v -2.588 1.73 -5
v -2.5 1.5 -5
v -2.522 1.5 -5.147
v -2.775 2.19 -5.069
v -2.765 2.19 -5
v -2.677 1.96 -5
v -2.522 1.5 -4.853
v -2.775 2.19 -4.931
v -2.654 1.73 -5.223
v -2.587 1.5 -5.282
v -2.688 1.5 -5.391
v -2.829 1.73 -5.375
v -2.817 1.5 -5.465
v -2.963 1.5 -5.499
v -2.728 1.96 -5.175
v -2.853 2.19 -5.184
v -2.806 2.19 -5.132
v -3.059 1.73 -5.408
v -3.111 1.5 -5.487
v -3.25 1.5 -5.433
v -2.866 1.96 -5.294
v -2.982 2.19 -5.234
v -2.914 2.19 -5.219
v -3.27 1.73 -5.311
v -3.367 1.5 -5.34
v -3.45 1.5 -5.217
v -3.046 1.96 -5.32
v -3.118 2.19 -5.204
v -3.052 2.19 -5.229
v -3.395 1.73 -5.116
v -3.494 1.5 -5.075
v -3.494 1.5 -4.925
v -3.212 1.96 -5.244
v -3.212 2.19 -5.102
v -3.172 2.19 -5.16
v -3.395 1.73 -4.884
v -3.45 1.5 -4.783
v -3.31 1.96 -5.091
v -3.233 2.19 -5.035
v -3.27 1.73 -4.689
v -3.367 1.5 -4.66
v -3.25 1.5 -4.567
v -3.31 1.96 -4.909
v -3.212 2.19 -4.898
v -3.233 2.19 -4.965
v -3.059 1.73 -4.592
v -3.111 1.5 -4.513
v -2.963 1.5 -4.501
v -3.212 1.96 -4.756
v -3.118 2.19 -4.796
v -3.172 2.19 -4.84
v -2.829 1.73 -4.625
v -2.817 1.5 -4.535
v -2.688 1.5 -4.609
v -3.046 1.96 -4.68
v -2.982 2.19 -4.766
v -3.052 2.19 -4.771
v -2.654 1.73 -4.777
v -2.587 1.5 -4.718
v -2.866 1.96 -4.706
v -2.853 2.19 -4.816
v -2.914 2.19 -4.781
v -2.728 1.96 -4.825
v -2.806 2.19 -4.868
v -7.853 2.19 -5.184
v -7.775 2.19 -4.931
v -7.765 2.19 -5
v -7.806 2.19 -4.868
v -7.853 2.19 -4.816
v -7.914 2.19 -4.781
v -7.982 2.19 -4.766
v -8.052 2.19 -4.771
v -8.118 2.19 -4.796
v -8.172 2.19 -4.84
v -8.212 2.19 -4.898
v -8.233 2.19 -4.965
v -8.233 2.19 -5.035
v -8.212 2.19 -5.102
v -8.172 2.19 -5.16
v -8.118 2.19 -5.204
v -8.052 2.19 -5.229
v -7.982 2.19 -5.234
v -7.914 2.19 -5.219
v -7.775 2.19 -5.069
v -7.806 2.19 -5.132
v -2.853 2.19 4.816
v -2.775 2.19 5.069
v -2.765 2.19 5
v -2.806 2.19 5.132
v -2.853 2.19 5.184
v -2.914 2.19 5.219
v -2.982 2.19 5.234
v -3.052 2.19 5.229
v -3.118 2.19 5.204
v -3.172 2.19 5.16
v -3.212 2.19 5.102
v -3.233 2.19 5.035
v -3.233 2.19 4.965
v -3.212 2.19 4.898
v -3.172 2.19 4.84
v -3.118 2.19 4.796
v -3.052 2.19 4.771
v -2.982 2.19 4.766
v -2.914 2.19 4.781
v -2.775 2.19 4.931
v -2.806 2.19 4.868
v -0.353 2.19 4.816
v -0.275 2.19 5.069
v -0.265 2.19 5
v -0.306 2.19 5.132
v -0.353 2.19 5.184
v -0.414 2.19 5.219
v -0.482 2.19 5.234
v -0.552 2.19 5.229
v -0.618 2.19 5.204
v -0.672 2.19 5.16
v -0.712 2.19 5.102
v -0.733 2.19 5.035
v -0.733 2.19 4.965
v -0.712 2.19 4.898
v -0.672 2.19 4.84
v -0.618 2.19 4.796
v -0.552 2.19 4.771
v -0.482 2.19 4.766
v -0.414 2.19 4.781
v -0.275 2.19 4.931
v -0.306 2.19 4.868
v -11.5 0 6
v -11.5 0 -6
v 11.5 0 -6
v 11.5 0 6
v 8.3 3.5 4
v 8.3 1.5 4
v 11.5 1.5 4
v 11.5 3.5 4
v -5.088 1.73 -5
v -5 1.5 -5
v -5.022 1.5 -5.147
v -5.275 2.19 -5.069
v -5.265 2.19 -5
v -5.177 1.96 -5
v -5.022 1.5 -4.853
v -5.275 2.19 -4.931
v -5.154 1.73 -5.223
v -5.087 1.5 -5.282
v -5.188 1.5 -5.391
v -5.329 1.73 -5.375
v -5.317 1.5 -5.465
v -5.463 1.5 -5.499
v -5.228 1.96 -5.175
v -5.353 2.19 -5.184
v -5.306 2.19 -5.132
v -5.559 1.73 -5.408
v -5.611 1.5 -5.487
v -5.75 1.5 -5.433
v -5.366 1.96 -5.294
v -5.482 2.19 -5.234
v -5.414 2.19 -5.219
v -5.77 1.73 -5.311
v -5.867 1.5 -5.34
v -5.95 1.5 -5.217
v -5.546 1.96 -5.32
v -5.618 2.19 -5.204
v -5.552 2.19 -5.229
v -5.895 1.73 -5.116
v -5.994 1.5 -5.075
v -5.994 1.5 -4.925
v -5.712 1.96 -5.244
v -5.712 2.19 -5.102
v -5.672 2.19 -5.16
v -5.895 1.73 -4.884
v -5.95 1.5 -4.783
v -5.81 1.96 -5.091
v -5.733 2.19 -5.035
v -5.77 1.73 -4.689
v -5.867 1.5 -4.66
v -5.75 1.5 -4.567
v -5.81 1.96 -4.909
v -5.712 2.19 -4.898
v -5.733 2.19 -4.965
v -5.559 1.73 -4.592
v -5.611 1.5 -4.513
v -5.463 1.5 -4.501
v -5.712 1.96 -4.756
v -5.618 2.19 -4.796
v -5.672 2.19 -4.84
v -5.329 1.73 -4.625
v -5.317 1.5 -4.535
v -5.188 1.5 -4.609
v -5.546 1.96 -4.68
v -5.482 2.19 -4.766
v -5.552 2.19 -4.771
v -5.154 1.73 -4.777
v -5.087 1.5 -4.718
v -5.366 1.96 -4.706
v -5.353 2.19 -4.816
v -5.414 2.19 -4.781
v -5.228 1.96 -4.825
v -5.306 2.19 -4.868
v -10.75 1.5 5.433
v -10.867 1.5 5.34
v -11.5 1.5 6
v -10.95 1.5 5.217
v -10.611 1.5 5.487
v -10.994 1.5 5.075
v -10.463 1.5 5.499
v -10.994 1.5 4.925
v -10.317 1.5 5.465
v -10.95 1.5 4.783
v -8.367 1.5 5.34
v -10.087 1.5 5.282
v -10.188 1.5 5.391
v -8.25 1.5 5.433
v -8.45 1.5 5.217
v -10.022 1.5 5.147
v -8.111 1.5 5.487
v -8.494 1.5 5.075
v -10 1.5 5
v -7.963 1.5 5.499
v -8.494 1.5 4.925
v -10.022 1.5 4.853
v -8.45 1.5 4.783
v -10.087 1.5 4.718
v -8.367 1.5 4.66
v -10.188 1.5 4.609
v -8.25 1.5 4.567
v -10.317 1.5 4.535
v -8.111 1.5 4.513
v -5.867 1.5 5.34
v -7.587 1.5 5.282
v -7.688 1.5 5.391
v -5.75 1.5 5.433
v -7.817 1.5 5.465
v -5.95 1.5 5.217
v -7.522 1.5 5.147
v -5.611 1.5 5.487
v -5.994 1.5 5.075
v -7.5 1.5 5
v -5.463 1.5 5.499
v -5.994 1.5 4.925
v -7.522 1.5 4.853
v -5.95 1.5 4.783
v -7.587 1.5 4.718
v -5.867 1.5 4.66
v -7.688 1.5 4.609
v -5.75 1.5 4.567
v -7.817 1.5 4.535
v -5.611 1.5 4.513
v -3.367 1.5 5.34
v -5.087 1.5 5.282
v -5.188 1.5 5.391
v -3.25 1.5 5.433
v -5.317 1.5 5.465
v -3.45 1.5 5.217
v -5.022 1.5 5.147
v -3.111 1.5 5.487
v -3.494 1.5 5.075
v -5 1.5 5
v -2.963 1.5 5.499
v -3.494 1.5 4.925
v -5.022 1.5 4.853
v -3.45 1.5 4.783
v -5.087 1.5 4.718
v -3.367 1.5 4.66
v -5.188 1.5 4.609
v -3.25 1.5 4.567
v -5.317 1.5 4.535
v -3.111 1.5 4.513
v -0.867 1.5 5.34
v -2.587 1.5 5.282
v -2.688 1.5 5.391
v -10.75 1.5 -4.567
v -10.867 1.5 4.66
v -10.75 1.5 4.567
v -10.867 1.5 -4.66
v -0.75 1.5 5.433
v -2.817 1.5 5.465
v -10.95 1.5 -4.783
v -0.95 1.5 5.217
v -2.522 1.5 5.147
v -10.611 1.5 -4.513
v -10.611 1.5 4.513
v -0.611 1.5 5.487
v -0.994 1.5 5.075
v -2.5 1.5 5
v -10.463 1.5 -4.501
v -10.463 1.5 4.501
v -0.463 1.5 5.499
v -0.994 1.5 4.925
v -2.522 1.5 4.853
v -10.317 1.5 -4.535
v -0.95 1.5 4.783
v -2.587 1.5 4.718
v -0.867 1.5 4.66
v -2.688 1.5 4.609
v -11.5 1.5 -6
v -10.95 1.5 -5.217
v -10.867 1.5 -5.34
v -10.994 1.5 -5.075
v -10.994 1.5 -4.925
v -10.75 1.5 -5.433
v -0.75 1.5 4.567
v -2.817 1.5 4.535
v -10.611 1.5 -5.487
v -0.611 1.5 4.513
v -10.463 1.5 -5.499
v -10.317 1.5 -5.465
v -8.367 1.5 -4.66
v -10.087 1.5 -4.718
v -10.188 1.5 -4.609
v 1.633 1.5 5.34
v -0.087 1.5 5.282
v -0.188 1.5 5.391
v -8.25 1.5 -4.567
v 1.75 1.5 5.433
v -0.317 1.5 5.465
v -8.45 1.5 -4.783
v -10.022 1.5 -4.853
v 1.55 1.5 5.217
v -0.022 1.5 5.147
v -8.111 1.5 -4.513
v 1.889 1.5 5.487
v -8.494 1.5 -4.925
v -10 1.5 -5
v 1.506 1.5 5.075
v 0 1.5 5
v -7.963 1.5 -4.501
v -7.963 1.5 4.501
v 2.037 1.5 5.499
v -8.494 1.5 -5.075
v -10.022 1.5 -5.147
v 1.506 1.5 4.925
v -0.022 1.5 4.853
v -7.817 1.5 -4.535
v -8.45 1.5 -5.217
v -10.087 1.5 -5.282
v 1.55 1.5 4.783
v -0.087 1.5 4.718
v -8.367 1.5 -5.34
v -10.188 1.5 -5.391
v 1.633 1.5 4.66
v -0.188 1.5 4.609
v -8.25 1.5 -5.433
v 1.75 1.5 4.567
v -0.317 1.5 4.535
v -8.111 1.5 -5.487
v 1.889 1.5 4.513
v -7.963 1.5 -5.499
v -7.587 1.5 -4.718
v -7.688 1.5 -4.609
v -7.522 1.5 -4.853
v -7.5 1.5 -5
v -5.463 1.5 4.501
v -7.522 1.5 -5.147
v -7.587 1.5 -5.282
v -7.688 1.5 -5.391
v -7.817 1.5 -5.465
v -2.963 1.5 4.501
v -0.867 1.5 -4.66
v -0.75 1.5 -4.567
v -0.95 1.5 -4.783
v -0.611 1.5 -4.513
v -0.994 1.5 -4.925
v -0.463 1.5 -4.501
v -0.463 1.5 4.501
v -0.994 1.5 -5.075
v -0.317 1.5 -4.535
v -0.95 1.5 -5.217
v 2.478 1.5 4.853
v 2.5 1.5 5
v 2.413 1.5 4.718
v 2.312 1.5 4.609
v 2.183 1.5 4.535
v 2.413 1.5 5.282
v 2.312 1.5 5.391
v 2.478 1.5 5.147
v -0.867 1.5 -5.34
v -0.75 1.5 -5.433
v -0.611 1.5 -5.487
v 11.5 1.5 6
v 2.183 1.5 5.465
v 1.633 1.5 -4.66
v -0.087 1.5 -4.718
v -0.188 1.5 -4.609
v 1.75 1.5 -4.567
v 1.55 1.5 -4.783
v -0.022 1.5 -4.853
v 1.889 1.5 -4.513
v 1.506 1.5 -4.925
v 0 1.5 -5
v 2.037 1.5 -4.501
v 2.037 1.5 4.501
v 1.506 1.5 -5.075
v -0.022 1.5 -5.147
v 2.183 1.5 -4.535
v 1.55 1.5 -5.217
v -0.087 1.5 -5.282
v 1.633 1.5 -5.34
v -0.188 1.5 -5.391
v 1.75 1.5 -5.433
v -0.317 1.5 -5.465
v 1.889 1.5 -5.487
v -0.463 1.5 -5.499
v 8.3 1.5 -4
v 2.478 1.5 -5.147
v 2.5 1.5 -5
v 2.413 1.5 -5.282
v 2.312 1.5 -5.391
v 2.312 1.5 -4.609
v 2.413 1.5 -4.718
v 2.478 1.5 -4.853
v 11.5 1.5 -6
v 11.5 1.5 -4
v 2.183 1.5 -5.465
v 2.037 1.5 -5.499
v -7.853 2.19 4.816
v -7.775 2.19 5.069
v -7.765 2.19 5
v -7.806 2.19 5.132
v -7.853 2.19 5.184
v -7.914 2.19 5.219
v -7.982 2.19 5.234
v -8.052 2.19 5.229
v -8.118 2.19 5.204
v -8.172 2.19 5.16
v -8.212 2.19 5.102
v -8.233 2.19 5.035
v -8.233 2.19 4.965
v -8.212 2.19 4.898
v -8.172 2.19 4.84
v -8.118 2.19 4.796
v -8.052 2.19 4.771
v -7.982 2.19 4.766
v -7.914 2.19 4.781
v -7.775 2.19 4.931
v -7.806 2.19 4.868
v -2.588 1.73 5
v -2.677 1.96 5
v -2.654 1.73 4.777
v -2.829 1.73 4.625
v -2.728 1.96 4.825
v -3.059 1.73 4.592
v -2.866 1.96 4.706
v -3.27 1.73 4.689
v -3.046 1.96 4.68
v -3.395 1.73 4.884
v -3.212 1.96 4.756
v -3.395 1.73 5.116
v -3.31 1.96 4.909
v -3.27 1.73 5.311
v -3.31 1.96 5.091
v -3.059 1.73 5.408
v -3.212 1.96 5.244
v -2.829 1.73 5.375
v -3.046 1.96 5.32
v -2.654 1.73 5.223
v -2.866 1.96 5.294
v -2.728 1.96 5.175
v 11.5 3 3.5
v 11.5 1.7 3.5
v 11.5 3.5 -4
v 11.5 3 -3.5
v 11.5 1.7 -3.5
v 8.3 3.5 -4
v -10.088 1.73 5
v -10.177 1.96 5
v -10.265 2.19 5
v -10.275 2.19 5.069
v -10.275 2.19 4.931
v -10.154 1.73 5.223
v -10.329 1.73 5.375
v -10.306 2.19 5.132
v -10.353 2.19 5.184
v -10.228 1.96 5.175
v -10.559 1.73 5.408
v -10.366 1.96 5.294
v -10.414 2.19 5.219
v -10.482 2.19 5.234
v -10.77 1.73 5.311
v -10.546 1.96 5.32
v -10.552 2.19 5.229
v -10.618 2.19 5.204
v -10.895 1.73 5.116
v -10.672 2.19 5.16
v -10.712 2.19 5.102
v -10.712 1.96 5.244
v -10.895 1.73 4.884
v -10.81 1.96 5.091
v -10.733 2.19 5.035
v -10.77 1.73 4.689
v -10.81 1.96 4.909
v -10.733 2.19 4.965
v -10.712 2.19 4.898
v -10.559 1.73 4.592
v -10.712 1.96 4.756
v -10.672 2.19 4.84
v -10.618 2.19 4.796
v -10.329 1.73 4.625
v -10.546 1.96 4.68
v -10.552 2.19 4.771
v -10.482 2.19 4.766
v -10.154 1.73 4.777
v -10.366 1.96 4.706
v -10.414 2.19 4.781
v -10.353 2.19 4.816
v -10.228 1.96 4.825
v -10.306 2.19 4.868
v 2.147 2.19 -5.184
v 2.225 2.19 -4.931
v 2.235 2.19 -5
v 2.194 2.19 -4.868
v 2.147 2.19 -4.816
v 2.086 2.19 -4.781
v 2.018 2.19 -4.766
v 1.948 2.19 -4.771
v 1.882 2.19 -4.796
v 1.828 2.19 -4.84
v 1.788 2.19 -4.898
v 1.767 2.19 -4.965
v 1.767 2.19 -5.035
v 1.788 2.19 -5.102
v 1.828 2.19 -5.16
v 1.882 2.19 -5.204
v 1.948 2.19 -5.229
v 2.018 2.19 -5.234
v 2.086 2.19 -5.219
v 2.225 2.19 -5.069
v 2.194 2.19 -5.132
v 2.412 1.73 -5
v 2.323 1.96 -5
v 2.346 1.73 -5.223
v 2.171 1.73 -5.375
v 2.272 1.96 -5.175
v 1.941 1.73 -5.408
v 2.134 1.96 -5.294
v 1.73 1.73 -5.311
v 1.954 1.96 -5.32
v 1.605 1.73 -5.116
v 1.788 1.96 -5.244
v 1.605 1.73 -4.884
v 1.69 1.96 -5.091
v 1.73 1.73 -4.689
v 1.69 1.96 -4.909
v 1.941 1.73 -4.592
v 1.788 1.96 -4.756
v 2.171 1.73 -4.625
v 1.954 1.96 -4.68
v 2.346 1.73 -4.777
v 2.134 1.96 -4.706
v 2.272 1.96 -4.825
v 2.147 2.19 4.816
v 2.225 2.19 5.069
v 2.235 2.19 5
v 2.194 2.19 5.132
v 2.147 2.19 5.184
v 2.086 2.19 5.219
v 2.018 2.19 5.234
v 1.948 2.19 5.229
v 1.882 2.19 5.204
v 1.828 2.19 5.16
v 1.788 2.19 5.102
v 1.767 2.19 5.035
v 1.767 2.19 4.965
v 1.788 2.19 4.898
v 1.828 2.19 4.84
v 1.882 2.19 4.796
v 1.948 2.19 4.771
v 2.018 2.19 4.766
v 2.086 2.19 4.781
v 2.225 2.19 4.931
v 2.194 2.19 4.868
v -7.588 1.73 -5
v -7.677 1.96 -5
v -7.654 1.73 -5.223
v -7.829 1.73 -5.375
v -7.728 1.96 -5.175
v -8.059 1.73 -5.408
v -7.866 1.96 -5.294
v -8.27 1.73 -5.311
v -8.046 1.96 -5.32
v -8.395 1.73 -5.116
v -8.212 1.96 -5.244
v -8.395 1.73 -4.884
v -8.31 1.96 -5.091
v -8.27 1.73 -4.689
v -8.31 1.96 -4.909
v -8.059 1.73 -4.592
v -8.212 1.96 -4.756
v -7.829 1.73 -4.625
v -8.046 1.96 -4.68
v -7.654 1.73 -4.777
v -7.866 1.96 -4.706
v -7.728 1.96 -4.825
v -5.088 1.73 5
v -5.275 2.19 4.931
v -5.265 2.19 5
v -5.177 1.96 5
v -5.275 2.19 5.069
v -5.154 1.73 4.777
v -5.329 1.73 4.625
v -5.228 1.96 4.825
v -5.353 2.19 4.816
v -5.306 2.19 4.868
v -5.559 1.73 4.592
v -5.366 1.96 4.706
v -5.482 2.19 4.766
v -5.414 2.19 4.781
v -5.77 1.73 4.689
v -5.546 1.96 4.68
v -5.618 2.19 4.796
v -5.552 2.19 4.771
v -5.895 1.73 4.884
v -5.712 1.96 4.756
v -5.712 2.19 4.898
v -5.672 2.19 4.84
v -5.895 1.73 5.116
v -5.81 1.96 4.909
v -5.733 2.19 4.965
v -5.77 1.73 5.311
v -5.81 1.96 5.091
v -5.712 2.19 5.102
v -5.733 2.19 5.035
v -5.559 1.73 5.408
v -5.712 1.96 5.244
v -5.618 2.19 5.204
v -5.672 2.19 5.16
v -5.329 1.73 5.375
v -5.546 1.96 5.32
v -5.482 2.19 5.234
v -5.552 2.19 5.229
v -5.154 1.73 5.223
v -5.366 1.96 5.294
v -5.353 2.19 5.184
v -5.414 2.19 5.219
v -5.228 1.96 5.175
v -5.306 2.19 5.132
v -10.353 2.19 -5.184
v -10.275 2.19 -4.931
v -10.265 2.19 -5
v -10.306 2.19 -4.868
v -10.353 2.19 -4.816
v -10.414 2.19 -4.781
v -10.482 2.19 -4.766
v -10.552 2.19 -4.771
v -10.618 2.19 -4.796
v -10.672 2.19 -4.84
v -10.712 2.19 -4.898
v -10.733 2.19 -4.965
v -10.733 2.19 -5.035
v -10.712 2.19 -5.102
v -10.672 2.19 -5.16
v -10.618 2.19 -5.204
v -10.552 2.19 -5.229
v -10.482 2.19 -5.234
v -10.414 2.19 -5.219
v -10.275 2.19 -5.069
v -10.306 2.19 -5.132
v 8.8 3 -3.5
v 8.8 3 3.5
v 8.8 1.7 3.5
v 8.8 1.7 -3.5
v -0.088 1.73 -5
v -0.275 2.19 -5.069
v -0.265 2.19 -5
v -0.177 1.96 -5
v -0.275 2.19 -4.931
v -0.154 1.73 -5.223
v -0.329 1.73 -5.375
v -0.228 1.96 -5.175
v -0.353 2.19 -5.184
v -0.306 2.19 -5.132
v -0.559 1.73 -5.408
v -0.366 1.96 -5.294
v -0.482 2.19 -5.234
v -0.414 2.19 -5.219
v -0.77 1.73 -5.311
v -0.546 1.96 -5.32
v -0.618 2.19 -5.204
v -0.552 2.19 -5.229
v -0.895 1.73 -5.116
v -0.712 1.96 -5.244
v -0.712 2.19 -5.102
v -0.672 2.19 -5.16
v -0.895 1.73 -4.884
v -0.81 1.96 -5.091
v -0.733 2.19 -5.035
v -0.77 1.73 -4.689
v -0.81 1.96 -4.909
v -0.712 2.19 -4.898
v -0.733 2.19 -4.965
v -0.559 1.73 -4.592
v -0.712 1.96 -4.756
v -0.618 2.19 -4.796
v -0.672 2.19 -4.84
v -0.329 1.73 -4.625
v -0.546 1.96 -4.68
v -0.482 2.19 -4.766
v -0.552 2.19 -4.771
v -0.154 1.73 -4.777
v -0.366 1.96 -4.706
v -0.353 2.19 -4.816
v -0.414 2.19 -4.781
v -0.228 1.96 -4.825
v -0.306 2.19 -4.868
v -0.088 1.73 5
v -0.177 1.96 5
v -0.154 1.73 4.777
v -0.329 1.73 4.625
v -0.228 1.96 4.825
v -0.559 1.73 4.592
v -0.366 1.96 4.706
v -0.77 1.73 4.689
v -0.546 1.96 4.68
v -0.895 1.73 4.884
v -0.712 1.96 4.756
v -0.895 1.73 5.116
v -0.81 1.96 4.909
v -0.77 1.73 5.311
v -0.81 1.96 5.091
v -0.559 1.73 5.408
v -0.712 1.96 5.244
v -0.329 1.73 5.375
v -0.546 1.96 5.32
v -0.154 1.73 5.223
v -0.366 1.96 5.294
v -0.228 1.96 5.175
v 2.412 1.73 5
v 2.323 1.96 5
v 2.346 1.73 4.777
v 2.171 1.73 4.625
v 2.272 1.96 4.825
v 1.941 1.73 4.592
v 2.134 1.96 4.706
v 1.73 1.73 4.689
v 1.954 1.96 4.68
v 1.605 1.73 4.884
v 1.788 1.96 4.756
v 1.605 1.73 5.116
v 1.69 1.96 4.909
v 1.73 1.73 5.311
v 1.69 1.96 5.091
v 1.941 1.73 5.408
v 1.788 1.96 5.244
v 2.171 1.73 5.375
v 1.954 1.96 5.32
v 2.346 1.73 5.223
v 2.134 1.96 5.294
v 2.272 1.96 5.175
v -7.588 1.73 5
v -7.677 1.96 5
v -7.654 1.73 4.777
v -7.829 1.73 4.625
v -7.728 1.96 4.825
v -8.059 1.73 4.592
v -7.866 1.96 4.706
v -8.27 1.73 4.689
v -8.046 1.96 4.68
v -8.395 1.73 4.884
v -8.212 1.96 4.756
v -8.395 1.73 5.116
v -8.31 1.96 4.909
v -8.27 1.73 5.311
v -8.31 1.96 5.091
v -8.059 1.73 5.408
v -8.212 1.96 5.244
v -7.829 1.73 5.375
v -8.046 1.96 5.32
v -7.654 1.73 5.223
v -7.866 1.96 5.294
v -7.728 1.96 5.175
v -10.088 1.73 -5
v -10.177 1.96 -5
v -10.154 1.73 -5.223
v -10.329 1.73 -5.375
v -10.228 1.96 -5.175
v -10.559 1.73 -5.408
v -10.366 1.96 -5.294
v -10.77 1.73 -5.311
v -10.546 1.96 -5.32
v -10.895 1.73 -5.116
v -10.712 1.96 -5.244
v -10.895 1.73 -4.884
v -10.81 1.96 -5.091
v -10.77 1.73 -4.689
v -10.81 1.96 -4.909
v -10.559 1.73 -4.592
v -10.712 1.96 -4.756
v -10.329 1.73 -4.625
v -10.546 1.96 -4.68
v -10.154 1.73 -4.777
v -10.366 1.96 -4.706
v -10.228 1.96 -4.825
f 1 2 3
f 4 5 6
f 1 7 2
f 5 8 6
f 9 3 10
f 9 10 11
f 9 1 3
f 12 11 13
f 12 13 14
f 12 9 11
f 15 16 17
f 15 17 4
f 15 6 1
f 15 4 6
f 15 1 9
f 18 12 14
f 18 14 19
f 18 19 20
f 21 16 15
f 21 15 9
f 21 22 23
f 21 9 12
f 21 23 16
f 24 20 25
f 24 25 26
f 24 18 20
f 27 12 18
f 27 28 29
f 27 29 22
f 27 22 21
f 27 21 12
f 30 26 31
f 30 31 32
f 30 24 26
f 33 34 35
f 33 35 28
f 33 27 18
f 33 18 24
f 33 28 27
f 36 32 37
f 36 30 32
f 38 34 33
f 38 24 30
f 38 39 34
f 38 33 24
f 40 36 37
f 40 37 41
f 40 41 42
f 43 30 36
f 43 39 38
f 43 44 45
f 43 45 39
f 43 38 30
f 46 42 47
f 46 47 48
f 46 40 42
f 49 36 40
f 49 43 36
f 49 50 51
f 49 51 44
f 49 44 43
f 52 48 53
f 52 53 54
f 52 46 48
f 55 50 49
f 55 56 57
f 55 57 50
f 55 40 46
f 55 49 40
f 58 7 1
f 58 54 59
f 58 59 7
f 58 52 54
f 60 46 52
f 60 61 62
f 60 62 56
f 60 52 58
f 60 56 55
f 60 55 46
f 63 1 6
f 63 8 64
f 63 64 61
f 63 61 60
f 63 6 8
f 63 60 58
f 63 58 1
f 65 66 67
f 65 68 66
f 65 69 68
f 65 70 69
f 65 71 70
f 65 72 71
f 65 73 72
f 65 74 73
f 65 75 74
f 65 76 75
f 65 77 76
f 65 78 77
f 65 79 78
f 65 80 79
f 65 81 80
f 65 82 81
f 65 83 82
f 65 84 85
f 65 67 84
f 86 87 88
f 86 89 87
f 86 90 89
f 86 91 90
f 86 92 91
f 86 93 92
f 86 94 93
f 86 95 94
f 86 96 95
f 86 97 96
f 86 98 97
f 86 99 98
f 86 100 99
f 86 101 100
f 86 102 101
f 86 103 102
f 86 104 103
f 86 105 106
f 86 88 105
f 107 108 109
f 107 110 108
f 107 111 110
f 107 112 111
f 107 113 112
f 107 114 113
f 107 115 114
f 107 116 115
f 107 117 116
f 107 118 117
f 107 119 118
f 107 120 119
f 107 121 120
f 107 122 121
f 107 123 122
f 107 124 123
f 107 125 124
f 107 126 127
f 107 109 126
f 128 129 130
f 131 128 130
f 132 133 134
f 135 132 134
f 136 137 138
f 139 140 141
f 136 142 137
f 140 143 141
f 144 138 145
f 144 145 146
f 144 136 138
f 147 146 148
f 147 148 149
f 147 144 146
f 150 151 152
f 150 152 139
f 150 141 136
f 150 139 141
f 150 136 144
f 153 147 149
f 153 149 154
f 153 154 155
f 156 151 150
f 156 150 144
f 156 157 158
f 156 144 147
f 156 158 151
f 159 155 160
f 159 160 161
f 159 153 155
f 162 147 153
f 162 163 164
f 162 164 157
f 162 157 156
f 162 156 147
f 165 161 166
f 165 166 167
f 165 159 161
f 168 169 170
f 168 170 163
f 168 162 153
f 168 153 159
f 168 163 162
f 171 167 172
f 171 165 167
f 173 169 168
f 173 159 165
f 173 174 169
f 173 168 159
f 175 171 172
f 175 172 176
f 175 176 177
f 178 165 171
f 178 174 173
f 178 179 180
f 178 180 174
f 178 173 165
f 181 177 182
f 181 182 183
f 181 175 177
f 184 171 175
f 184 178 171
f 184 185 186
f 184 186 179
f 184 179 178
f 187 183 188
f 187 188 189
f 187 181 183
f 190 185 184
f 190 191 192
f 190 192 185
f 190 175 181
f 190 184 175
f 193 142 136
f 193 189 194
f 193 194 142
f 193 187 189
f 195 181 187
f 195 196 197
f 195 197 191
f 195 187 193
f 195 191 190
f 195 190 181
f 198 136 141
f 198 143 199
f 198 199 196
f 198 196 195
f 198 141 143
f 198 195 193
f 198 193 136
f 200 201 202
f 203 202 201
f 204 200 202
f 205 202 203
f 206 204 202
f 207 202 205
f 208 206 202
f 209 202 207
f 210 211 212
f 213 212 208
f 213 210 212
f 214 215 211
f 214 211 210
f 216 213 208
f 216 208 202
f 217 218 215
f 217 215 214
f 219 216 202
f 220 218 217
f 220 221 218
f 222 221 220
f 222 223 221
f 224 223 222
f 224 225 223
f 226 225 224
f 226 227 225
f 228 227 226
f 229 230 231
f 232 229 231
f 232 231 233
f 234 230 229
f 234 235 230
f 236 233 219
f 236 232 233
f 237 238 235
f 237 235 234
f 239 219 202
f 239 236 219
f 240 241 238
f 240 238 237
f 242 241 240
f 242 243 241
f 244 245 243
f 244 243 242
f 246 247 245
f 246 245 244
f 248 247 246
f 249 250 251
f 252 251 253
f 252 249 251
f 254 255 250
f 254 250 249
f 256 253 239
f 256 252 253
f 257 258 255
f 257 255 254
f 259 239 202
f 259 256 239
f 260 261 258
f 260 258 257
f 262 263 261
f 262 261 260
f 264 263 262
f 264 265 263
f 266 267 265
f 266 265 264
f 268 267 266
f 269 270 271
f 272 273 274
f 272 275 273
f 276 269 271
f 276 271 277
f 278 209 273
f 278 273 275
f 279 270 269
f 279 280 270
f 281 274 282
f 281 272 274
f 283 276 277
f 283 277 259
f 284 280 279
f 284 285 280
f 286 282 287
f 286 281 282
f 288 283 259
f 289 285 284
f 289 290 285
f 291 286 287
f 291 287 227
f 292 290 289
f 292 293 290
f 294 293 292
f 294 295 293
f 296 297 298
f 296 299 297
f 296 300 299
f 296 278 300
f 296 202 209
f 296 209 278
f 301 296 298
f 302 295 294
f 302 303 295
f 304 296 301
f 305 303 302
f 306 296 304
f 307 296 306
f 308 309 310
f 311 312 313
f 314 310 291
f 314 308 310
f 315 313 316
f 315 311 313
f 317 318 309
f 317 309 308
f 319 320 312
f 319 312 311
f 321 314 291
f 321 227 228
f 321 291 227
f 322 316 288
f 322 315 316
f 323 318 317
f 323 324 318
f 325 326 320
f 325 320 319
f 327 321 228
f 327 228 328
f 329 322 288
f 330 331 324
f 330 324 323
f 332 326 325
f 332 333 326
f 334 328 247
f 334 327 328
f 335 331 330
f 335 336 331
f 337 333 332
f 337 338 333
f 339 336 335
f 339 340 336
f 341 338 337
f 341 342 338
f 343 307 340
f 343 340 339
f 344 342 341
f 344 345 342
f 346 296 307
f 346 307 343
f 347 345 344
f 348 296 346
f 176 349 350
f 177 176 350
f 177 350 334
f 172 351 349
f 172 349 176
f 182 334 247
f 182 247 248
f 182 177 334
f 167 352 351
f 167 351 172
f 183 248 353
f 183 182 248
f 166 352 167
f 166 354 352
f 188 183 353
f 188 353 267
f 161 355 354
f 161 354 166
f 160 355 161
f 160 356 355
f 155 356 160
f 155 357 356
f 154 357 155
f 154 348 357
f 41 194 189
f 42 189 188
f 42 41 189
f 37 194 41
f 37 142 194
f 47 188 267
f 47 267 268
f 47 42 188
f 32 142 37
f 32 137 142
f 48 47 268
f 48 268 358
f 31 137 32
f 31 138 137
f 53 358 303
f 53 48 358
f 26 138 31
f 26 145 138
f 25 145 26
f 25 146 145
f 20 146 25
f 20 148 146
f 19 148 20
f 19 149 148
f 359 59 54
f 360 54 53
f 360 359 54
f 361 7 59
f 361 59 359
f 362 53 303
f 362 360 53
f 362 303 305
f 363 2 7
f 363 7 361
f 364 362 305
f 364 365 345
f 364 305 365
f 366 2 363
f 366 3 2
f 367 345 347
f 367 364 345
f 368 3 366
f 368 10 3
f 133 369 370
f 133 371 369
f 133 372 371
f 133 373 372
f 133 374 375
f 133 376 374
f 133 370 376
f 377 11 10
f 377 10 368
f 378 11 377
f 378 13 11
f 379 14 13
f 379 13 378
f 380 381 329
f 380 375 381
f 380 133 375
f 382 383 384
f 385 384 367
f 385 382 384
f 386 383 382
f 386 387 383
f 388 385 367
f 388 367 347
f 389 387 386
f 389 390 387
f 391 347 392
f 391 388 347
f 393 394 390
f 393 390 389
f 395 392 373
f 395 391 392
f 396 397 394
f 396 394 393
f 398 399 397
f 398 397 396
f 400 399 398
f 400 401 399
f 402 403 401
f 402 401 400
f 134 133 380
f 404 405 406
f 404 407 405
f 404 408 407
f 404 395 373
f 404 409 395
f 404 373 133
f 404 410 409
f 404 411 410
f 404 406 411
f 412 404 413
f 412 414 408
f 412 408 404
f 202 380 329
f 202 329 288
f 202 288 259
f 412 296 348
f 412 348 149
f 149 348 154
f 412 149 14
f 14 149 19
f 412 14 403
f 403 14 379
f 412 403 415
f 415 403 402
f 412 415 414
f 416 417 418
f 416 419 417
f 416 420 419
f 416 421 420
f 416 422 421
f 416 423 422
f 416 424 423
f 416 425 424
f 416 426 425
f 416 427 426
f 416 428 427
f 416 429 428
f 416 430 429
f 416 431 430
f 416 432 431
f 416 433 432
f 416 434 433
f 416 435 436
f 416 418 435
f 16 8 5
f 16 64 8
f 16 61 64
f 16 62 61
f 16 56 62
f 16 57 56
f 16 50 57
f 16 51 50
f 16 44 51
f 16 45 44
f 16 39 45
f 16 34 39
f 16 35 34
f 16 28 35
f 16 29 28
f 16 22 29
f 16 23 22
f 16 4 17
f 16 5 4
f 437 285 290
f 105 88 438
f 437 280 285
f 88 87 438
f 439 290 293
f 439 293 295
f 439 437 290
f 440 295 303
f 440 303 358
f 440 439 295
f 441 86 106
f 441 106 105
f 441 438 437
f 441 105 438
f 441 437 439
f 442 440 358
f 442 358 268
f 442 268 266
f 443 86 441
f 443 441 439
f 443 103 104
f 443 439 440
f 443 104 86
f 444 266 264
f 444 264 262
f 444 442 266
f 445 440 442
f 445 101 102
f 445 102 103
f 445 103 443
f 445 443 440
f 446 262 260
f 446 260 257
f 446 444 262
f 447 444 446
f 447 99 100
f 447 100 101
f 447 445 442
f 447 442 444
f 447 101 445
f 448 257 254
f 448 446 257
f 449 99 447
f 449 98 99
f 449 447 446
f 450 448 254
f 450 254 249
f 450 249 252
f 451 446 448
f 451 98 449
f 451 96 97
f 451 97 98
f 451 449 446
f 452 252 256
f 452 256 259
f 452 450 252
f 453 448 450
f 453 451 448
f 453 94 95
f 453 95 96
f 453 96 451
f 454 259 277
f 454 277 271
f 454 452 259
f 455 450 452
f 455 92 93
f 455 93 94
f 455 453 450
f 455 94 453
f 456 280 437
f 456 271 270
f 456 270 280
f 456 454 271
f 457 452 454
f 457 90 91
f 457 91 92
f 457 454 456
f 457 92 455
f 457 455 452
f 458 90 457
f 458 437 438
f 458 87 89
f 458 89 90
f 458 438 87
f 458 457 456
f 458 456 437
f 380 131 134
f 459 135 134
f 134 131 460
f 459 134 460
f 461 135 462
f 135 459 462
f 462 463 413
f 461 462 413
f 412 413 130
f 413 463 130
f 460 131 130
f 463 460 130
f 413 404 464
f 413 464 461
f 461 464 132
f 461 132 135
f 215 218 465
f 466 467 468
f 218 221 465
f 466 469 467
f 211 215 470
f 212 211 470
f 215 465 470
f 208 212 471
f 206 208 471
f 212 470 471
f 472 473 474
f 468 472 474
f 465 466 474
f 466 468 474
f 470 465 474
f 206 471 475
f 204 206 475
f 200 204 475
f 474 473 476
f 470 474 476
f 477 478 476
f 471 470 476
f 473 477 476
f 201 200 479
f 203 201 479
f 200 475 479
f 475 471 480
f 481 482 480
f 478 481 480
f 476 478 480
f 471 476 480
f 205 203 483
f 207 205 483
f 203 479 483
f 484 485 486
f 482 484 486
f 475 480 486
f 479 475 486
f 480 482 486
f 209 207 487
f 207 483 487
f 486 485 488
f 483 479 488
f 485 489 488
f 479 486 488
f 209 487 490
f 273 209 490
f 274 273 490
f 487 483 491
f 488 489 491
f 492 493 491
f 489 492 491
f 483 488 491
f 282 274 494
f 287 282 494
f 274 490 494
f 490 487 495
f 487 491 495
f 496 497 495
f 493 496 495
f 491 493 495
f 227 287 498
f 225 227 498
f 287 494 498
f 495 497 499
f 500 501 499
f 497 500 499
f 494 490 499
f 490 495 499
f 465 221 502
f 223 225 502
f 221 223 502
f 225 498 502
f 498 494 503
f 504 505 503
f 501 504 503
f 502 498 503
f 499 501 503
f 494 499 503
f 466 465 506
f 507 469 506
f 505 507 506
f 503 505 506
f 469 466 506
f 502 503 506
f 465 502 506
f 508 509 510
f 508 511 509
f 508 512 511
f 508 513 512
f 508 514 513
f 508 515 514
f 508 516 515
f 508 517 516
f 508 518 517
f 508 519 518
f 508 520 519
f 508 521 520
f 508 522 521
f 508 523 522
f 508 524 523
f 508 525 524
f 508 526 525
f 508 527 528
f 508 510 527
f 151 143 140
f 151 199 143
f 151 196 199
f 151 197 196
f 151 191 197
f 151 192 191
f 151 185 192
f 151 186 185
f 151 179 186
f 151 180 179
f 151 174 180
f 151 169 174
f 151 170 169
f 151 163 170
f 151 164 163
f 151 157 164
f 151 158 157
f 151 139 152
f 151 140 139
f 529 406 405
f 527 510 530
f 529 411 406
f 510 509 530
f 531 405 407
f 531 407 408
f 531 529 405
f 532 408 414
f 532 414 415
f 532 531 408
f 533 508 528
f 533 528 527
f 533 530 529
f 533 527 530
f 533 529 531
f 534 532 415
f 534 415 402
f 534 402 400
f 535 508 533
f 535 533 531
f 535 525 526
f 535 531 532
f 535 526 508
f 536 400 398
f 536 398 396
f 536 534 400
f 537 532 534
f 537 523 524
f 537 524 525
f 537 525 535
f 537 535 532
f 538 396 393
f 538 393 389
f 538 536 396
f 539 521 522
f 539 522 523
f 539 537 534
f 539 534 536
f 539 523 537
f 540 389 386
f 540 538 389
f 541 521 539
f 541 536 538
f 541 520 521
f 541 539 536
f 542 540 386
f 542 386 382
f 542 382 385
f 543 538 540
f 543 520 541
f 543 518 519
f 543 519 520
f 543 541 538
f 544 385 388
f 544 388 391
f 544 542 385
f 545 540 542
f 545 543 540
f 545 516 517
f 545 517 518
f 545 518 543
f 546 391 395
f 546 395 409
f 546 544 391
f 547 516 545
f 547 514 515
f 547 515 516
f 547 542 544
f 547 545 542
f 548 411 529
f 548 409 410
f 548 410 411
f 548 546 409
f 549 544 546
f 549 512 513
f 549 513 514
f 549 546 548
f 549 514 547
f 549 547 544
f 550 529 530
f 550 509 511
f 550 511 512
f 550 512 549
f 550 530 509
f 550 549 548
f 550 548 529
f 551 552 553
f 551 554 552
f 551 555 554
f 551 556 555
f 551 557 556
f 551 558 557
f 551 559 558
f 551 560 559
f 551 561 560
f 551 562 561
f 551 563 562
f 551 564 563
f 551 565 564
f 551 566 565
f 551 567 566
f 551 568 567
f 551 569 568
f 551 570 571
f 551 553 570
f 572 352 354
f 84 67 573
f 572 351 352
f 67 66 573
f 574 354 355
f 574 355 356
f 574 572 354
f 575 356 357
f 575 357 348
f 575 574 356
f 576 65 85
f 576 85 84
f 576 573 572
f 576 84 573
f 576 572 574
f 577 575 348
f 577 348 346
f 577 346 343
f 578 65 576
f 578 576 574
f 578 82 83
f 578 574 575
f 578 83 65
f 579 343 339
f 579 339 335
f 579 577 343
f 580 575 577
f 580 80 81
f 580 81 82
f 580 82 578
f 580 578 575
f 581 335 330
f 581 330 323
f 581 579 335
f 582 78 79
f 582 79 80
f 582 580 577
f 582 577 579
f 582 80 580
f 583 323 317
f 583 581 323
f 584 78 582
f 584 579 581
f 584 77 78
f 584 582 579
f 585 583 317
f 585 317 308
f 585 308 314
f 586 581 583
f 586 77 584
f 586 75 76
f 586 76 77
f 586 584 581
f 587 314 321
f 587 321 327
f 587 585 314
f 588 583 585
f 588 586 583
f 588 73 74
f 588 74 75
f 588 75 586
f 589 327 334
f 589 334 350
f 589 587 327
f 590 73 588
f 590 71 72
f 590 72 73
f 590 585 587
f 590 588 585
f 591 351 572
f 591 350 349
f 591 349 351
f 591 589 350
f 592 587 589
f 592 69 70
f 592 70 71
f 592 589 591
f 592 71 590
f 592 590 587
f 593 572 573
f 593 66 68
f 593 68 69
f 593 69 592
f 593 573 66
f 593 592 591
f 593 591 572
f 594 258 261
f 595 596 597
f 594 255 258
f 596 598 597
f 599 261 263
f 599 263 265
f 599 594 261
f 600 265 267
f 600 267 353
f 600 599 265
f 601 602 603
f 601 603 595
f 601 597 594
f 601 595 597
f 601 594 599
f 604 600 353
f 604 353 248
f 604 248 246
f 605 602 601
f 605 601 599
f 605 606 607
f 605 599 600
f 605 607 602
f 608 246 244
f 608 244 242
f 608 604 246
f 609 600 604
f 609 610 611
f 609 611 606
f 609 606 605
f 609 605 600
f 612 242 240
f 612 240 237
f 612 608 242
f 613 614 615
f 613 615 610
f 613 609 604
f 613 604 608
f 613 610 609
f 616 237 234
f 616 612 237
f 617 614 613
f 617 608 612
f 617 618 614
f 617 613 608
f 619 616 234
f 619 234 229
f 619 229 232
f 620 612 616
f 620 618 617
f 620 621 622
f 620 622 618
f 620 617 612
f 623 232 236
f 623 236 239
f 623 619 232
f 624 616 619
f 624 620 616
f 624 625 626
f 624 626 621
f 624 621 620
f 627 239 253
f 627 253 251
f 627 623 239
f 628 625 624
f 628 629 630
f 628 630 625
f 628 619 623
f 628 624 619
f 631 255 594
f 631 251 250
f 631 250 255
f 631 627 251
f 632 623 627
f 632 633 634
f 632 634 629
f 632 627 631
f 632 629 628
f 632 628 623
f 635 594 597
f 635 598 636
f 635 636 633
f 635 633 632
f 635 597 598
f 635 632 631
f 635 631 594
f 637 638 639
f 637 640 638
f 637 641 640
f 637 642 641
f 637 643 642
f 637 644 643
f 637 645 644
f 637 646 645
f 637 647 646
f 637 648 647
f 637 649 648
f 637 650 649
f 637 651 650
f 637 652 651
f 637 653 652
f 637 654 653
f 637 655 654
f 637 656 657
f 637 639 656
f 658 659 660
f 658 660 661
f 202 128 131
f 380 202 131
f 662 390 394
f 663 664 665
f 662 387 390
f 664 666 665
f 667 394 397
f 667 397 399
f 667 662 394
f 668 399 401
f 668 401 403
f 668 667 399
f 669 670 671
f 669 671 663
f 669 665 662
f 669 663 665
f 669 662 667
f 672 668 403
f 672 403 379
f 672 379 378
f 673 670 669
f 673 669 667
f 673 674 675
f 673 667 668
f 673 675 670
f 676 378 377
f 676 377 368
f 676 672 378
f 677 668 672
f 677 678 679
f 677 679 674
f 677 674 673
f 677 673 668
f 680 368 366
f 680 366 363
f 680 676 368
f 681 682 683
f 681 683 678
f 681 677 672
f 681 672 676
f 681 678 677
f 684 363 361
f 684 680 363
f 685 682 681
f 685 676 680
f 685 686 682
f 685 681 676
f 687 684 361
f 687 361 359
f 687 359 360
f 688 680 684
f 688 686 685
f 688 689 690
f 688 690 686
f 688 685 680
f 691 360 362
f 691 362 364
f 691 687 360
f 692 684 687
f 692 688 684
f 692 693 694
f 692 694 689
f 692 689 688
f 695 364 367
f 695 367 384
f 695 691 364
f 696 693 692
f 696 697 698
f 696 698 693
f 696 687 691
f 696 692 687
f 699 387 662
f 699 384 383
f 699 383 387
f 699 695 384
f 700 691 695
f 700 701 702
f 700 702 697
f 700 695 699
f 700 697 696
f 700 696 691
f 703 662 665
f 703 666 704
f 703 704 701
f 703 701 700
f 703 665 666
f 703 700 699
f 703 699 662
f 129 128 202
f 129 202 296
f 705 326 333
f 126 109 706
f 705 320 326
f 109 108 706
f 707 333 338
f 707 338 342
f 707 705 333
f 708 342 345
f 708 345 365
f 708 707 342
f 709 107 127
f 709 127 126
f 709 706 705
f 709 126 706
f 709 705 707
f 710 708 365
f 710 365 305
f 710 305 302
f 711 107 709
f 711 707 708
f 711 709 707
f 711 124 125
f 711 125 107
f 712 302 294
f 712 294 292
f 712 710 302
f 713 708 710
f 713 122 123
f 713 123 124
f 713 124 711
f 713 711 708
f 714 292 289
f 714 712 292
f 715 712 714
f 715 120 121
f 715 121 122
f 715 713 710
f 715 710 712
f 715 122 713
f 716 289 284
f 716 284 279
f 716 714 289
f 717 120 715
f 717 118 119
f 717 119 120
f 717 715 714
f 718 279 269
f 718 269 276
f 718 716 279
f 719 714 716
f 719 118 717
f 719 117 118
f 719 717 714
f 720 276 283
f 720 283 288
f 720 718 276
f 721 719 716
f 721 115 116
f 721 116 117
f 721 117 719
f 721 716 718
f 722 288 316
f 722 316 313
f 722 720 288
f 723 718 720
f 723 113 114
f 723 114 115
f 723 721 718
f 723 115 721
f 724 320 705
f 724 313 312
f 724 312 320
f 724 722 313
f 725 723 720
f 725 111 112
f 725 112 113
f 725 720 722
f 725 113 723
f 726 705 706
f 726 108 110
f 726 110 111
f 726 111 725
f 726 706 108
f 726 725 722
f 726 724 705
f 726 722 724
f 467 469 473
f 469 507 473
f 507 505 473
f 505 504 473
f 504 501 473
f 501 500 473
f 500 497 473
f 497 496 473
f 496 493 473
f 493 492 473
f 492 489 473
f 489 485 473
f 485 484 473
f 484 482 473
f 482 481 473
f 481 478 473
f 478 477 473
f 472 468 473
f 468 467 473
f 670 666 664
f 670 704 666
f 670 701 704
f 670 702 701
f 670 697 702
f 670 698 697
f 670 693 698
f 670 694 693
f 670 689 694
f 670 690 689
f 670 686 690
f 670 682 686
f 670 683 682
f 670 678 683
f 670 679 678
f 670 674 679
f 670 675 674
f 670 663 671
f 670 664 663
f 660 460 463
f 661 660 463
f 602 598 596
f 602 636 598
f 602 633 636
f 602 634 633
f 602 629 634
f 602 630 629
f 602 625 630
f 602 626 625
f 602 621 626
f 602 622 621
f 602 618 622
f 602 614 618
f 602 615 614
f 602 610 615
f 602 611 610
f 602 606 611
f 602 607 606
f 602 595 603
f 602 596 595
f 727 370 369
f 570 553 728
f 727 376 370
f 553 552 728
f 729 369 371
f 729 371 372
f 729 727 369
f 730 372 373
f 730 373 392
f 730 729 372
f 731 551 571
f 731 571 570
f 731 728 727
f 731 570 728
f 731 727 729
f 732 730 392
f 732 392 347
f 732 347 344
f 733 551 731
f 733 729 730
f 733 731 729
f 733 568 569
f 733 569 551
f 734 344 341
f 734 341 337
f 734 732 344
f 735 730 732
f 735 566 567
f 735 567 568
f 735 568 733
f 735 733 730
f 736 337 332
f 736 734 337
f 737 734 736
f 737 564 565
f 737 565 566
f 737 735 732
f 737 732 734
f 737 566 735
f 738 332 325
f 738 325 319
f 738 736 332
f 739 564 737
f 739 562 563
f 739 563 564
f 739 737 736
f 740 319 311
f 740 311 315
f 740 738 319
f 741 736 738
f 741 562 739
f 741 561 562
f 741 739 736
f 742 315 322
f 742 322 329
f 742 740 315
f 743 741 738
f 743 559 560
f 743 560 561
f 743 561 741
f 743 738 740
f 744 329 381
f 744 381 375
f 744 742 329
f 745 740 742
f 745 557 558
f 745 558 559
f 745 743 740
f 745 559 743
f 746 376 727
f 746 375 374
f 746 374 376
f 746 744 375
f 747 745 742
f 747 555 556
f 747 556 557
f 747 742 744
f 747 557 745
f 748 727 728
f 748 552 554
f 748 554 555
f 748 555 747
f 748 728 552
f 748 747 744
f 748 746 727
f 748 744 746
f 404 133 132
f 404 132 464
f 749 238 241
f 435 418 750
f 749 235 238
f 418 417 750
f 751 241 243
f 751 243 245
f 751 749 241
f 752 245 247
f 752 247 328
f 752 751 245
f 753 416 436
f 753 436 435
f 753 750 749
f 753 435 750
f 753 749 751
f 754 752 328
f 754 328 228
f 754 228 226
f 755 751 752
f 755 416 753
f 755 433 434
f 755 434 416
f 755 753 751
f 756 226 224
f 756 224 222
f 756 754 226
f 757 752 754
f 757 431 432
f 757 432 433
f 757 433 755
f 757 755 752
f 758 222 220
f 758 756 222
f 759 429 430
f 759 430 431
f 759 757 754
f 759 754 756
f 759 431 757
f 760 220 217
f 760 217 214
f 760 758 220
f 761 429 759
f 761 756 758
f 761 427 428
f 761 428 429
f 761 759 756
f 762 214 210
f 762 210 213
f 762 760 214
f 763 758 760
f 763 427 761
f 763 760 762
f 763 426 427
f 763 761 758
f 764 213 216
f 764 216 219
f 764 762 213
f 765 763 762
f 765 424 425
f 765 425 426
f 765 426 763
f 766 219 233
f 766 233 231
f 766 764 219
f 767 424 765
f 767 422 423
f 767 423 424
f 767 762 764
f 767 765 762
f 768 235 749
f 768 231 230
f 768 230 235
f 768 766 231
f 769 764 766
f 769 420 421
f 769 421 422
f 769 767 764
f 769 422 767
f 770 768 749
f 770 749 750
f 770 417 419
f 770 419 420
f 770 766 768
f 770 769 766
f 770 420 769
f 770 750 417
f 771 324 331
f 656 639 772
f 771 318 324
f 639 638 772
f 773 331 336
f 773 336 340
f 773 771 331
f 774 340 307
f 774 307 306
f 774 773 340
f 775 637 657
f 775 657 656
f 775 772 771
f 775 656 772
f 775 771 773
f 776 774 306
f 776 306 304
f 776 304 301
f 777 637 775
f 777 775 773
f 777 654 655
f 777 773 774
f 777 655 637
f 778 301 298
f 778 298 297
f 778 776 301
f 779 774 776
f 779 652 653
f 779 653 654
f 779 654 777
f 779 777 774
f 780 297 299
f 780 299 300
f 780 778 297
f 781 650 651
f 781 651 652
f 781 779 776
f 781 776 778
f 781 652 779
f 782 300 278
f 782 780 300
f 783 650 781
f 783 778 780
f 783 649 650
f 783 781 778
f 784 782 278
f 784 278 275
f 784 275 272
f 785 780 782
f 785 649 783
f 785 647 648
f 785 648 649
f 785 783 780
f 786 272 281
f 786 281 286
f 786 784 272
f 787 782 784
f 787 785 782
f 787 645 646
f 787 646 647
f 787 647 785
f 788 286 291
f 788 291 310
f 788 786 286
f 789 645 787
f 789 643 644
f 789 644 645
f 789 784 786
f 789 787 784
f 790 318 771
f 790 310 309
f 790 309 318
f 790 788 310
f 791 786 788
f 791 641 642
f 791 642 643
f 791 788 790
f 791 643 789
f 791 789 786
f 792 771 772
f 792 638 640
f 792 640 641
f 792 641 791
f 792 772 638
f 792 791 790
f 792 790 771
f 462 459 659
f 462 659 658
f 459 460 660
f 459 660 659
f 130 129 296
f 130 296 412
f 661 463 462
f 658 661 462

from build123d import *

# Parameters (mm, degrees)
SKETCH1_W               = 23
SKETCH1_H               = 12
BOSS_EXTRUDE1_DEPTH     = 1.5
SKETCH2_W               = 3.2
SKETCH2_H               = 8
BOSS_EXTRUDE2_DEPTH     = 2
SKETCH3_W               = 7
SKETCH3_H               = 1.3
CUT_EXTRUDE1_DEPTH      = 2.7
SKETCH4_R               = 0.5
BOSS_EXTRUDE3_DEPTH     = 0.69
BOSS_EXTRUDE3_TAPER     = 21
LPATTERN1_COUNT         = 6
LPATTERN1_PITCH         = 2.5
MIRROR1_COPY_1_SKETCH_R = 0.5
MIRROR1_COPY_1_DEPTH    = 0.69
MIRROR1_COPY_1_TAPER    = 21
MIRROR1_COPY_2_SKETCH_R = 0.5
MIRROR1_COPY_2_DEPTH    = 0.69
MIRROR1_COPY_2_TAPER    = 21
MIRROR1_COPY_3_SKETCH_R = 0.5
MIRROR1_COPY_3_DEPTH    = 0.69
MIRROR1_COPY_3_TAPER    = 21
MIRROR1_COPY_4_SKETCH_R = 0.5
MIRROR1_COPY_4_DEPTH    = 0.69
MIRROR1_COPY_4_TAPER    = 21
MIRROR1_COPY_5_SKETCH_R = 0.5
MIRROR1_COPY_5_DEPTH    = 0.69
MIRROR1_COPY_5_TAPER    = 21


with BuildPart() as part:
    # Sketch1 → Boss-Extrude1 (new body)
    with BuildSketch(Plane(origin=(0, 0, 0), x_dir=(1, 0, 0), z_dir=(0, 1, 0))):
        Rectangle(SKETCH1_W, SKETCH1_H)
    extrude(amount=BOSS_EXTRUDE1_DEPTH)

    # Sketch2 → Boss-Extrude2 (add)
    with BuildSketch(Plane(origin=(0, 1.5, 0), x_dir=(1, 0, 0), z_dir=(0, 1, 0))):
        with Locations((9.9, 0)):
            Rectangle(SKETCH2_W, SKETCH2_H)
    extrude(amount=BOSS_EXTRUDE2_DEPTH)

    # Sketch3 → Cut-Extrude1 (cut)
    with BuildSketch(Plane(origin=(11.5, 0, 0), x_dir=(0, 0, -1), z_dir=(1, 0, 0))):
        with Locations((0, 2.35)):
            Rectangle(SKETCH3_W, SKETCH3_H)
    extrude(amount=-CUT_EXTRUDE1_DEPTH, mode=Mode.SUBTRACT)

    # Sketch4 → Boss-Extrude3 (add)
    with BuildSketch(Plane(origin=(0, 1.5, 0), x_dir=(1, 0, 0), z_dir=(0, 1, 0))):
        with Locations((-10.5, 5)):
            Circle(SKETCH4_R)
    boss_extrude3 = extrude(amount=BOSS_EXTRUDE3_DEPTH, taper=BOSS_EXTRUDE3_TAPER)

    # LPattern1: Boss-Extrude3 ×6
    with Locations(*[(i * LPATTERN1_PITCH, 0, 0) for i in range(1, LPATTERN1_COUNT)]):
        add(boss_extrude3)

    # Mirror1: Boss-Extrude3 across plane
    add(boss_extrude3.mirror(Plane.XY))

    # Mirror1 copy 1 sketch → Mirror1 copy 1 (add)
    with BuildSketch(Plane(origin=(2.5, 1.5, 0), x_dir=(1, 0, 0), z_dir=(0, 1, 0))):
        with Locations((-10.5, -5)):
            Circle(MIRROR1_COPY_1_SKETCH_R)
    extrude(amount=MIRROR1_COPY_1_DEPTH, taper=MIRROR1_COPY_1_TAPER)

    # Mirror1 copy 2 sketch → Mirror1 copy 2 (add)
    with BuildSketch(Plane(origin=(5, 1.5, 0), x_dir=(1, 0, 0), z_dir=(0, 1, 0))):
        with Locations((-10.5, -5)):
            Circle(MIRROR1_COPY_2_SKETCH_R)
    extrude(amount=MIRROR1_COPY_2_DEPTH, taper=MIRROR1_COPY_2_TAPER)

    # Mirror1 copy 3 sketch → Mirror1 copy 3 (add)
    with BuildSketch(Plane(origin=(7.5, 1.5, 0), x_dir=(1, 0, 0), z_dir=(0, 1, 0))):
        with Locations((-10.5, -5)):
            Circle(MIRROR1_COPY_3_SKETCH_R)
    extrude(amount=MIRROR1_COPY_3_DEPTH, taper=MIRROR1_COPY_3_TAPER)

    # Mirror1 copy 4 sketch → Mirror1 copy 4 (add)
    with BuildSketch(Plane(origin=(10, 1.5, 0), x_dir=(1, 0, 0), z_dir=(0, 1, 0))):
        with Locations((-10.5, -5)):
            Circle(MIRROR1_COPY_4_SKETCH_R)
    extrude(amount=MIRROR1_COPY_4_DEPTH, taper=MIRROR1_COPY_4_TAPER)

    # Mirror1 copy 5 sketch → Mirror1 copy 5 (add)
    with BuildSketch(Plane(origin=(12.5, 1.5, 0), x_dir=(1, 0, 0), z_dir=(0, 1, 0))):
        with Locations((-10.5, -5)):
            Circle(MIRROR1_COPY_5_SKETCH_R)
    extrude(amount=MIRROR1_COPY_5_DEPTH, taper=MIRROR1_COPY_5_TAPER)


solid = part.part
